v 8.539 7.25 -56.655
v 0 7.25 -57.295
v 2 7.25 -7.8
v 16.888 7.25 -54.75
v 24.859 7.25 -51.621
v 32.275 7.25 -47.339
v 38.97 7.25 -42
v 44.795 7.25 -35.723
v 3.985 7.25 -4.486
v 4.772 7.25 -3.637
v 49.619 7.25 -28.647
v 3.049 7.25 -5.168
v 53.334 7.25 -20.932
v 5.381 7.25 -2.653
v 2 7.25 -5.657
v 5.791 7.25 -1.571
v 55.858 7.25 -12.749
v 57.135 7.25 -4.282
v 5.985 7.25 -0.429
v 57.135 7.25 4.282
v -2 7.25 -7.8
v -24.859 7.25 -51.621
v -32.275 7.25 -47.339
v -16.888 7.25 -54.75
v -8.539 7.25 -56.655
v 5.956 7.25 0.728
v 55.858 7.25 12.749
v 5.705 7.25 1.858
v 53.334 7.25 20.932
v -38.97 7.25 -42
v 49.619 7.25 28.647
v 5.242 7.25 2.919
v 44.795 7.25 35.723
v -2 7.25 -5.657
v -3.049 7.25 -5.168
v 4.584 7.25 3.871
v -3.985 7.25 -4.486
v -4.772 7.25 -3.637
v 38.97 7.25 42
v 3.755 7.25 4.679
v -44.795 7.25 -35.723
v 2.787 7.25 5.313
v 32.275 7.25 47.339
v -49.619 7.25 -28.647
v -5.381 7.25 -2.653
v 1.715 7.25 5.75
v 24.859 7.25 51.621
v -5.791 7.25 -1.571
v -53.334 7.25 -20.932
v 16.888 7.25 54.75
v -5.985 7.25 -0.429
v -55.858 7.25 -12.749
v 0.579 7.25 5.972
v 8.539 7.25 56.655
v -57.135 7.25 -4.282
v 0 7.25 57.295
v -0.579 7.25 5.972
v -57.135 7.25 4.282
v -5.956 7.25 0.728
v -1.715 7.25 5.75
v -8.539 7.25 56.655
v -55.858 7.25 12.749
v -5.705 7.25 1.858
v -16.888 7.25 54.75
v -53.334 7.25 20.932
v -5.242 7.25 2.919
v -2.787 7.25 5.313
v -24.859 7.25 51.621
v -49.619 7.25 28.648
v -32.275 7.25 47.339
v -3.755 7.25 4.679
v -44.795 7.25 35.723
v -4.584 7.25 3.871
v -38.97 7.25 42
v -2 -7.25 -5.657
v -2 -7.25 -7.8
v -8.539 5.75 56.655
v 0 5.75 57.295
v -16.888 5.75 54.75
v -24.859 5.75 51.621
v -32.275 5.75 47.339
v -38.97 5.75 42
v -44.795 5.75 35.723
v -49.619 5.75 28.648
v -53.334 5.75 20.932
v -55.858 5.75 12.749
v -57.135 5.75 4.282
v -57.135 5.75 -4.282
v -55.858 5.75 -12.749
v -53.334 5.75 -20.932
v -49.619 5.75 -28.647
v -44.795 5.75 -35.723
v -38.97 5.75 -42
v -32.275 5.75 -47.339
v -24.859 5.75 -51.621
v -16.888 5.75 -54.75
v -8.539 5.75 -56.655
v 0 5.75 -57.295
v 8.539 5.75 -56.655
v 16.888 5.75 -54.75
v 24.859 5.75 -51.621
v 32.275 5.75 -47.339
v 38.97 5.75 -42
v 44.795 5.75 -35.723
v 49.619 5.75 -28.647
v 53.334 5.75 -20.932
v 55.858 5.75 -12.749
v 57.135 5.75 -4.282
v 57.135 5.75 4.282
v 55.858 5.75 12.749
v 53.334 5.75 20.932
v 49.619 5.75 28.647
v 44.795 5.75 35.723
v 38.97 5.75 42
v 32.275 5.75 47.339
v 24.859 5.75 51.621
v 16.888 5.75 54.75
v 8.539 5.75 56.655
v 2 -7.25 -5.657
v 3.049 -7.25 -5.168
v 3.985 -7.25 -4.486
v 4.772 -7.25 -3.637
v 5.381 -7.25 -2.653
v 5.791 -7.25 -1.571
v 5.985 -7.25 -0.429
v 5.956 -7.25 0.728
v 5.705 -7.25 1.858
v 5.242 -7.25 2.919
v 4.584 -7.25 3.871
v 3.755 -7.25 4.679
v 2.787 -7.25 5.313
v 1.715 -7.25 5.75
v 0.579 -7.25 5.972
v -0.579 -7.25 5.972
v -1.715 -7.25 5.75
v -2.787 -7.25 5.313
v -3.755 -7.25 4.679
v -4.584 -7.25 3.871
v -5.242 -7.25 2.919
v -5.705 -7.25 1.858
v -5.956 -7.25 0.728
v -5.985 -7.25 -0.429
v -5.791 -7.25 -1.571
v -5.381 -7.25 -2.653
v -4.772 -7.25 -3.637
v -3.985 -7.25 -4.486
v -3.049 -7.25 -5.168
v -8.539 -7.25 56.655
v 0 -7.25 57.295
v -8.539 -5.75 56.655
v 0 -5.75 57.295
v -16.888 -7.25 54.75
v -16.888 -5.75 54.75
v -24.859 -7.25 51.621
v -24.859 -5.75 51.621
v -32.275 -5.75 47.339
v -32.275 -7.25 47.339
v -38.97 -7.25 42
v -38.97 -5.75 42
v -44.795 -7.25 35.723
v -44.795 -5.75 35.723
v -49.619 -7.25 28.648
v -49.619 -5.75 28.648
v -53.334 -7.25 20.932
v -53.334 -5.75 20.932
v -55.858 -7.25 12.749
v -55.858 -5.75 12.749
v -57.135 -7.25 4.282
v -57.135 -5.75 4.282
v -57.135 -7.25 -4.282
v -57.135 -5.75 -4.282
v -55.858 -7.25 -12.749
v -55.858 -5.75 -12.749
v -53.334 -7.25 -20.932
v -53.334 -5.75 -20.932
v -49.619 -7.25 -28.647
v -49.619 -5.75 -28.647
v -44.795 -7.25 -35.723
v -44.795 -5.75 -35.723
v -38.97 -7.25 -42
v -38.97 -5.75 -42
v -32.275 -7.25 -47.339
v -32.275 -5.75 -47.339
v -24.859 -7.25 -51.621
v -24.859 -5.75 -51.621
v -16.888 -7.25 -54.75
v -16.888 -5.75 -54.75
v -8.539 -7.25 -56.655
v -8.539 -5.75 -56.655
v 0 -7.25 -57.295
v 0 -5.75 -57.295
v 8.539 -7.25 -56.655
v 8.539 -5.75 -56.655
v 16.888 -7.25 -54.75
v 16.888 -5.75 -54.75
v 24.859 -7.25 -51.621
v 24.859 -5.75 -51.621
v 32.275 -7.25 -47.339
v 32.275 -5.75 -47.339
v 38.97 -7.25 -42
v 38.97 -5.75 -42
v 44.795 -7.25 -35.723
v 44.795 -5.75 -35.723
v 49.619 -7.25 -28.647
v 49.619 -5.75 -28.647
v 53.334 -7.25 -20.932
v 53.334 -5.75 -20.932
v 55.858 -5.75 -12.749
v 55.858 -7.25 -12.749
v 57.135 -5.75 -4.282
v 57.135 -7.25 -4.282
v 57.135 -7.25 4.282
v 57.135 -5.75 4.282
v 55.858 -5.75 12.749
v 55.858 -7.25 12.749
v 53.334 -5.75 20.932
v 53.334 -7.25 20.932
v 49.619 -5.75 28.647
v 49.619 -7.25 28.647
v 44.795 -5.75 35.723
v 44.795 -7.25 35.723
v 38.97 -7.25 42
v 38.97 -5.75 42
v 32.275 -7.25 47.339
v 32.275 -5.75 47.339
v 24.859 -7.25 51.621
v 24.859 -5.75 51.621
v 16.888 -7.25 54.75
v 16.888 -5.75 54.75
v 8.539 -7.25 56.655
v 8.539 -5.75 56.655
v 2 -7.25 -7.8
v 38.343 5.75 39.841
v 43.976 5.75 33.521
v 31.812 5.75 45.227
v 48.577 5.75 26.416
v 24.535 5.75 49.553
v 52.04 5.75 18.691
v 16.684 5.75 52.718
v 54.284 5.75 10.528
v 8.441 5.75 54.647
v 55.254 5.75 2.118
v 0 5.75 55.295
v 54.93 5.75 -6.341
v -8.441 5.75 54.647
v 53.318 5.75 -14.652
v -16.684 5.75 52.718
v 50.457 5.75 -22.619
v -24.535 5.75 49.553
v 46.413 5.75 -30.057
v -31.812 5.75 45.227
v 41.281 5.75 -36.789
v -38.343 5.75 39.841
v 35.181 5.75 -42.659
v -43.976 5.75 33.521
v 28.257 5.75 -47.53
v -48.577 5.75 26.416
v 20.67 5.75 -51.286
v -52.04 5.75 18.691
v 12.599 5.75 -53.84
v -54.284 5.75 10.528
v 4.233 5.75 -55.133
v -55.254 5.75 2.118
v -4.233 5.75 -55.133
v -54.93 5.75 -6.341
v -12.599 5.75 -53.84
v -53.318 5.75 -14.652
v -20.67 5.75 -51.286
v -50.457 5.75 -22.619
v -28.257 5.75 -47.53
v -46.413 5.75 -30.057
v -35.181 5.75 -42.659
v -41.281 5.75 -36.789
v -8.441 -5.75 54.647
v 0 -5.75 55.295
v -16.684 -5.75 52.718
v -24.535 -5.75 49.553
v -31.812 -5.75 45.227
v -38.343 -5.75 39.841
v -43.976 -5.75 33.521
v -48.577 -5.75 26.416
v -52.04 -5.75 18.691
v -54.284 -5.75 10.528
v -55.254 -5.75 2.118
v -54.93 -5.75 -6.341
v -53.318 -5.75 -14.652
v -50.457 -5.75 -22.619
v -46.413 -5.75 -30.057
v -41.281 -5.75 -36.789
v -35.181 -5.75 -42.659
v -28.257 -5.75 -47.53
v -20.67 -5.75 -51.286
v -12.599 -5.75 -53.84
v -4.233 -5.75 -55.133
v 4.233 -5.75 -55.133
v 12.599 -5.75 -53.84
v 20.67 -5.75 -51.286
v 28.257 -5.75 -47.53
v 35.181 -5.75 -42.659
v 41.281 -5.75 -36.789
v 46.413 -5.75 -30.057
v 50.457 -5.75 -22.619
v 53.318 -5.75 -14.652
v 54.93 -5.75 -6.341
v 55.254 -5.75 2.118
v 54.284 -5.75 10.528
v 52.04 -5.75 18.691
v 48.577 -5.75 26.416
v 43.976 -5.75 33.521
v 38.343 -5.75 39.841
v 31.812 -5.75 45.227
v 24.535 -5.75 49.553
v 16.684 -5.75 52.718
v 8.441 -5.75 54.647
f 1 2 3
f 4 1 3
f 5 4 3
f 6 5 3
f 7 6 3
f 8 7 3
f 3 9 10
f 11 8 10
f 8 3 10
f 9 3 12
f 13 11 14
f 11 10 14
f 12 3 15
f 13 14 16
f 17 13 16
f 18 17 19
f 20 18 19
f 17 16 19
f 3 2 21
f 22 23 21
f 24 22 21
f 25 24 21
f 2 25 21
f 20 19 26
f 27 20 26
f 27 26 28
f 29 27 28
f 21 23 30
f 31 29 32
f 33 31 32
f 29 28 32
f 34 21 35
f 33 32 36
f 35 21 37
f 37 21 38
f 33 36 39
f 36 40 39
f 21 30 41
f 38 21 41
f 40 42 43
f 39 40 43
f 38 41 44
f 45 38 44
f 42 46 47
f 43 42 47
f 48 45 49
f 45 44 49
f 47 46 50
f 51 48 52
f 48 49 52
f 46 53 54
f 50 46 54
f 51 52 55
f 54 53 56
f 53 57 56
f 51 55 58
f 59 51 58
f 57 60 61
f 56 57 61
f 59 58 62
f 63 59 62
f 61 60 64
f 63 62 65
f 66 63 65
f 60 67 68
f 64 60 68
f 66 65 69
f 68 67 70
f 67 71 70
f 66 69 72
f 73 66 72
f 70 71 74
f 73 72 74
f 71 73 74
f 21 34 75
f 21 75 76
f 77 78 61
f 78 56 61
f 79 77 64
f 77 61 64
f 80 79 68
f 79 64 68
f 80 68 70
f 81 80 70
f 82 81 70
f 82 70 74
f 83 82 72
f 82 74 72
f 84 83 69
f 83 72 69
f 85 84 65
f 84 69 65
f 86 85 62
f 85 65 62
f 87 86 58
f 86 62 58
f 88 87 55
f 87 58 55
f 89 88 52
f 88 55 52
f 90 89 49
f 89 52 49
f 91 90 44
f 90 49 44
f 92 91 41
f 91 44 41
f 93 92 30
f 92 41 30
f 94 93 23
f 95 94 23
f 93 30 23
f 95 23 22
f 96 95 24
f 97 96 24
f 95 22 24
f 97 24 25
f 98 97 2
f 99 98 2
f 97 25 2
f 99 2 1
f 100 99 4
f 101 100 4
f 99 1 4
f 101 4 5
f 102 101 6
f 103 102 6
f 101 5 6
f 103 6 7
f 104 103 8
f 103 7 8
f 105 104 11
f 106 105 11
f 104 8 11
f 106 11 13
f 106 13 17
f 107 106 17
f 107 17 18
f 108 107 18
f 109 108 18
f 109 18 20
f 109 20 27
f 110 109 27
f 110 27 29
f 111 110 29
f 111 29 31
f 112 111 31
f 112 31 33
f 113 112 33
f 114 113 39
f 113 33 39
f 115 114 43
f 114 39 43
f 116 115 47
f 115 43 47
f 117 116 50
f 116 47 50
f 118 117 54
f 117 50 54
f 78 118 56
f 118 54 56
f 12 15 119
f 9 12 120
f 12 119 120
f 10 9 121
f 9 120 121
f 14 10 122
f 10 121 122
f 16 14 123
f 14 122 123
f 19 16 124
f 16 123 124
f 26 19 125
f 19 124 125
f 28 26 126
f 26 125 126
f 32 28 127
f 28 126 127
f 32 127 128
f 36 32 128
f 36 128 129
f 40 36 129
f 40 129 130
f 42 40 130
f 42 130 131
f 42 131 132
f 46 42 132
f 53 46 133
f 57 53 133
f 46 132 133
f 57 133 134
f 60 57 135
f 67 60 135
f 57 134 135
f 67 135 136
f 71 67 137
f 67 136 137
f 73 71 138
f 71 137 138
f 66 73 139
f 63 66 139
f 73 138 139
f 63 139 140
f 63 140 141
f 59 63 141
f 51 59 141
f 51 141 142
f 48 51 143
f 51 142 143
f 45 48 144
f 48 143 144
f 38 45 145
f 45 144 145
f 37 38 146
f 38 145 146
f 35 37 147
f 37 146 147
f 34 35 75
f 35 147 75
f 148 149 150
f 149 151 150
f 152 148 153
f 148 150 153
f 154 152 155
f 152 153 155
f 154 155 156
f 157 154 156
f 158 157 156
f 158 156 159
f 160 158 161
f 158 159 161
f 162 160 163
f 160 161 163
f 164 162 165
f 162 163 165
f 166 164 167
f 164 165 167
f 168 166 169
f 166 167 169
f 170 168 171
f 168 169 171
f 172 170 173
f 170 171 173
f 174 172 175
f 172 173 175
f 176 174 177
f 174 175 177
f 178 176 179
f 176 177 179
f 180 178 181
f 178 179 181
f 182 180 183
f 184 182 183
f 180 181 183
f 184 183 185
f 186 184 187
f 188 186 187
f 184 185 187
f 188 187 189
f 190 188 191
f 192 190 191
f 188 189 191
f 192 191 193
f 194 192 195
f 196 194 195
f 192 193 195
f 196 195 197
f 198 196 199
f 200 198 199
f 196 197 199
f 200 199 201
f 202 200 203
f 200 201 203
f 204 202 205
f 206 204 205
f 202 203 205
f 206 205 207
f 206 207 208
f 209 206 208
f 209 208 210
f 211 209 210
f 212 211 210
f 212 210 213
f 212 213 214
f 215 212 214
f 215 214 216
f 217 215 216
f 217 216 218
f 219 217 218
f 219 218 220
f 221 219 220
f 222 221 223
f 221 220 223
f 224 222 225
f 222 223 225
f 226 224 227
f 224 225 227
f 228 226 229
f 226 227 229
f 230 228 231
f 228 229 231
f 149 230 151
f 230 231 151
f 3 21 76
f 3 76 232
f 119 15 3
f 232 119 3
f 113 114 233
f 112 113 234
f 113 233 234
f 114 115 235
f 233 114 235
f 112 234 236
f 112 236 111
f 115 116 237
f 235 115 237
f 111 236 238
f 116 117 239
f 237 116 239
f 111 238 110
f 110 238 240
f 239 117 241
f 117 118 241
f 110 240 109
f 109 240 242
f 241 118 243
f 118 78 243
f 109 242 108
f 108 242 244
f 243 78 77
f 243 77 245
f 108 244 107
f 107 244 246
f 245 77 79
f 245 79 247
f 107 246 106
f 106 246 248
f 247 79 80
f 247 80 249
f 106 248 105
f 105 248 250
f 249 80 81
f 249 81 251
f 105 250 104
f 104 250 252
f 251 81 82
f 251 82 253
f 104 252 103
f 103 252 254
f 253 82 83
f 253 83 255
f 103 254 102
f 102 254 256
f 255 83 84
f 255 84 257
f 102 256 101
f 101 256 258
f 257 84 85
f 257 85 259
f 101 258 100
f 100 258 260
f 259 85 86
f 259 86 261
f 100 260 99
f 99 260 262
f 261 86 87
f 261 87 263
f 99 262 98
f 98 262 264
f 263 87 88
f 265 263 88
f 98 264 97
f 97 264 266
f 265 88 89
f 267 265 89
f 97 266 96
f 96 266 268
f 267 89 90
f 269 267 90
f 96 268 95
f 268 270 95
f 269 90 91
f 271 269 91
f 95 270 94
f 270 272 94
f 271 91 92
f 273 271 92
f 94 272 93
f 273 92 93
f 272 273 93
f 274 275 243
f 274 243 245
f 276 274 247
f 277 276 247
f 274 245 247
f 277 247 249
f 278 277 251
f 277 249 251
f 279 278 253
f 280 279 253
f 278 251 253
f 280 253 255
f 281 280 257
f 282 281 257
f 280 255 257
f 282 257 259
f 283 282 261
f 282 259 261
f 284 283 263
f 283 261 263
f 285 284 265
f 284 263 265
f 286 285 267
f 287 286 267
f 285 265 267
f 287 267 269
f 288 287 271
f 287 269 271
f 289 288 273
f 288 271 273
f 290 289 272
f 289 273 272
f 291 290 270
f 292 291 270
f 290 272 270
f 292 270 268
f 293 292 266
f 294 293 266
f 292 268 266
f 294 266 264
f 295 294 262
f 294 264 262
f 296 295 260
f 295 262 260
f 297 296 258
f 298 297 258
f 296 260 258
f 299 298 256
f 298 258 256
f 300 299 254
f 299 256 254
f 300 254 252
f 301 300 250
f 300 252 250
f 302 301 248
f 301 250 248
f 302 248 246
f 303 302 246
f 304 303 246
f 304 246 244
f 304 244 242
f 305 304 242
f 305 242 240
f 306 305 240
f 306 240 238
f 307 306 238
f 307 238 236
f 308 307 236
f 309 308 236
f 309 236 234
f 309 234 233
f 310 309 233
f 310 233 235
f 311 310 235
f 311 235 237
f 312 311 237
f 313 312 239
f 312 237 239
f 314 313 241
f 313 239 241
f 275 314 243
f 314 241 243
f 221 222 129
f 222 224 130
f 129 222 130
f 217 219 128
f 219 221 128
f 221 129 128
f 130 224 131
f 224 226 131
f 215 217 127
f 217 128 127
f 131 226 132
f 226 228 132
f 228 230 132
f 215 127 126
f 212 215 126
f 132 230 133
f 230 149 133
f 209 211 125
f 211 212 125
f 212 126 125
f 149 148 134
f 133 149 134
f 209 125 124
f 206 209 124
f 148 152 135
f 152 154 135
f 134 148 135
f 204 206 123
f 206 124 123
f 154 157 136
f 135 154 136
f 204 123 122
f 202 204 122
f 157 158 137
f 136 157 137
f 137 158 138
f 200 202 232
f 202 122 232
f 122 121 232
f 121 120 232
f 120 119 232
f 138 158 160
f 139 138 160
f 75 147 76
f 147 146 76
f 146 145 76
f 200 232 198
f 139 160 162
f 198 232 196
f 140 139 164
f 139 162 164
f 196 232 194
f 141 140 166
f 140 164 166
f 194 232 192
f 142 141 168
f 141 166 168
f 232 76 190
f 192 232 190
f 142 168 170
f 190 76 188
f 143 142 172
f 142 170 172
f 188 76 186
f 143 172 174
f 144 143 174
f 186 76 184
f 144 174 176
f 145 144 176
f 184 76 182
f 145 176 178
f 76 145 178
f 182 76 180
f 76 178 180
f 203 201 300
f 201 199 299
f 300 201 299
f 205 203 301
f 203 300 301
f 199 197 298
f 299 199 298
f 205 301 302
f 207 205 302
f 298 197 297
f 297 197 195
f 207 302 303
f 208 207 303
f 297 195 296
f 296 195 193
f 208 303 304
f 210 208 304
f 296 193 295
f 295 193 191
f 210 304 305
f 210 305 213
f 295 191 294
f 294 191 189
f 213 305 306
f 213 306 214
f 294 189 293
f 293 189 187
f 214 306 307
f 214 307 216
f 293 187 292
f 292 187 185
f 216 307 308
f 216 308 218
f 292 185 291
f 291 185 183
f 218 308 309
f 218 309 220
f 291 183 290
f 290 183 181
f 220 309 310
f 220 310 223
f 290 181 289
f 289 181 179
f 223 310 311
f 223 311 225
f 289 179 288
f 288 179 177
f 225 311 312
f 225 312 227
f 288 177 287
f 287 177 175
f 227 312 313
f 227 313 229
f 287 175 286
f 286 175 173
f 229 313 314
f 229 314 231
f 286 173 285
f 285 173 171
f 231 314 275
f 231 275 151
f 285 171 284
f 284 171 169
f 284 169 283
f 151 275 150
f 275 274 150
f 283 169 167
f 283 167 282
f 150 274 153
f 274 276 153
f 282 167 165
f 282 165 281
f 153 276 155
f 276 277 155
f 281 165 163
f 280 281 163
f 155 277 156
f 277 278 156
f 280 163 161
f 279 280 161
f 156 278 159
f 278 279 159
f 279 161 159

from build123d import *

# Parameters (mm, degrees)
SKETCH2_W          = 4
SKETCH2_H          = 4.3
CUT_EXTRUDE1_DEPTH = 83.314543369


with BuildPart() as part:
    # Sketch1 → Revolve1 (revolve)
    with BuildSketch(Plane(origin=(0, 0, 0), x_dir=(0, 0, -1), z_dir=(1, 0, 0)), mode=Mode.PRIVATE) as revolve1_sk:
        Polygon((55.295, -5.75), (55.295, 5.75), (57.295, 5.75), (57.295, 7.25), (6, 7.25), (6, -7.25), (57.295, -7.25), (57.295, -5.75), align=None)
    revolve(revolve1_sk.sketch.rotate(Axis((0, 10.31552251, 0), (0, -1, 0)), 180), axis=Axis((0, 10.31552251, 0), (0, -1, 0)))

    # Sketch2 → Cut-Extrude1 (cut, through all)
    with BuildSketch(Plane(origin=(0, 7.25, 0), x_dir=(1, 0, 0), z_dir=(0, 1, 0))):
        with Locations((0, 5.65)):
            Rectangle(SKETCH2_W, SKETCH2_H)
    extrude(amount=-CUT_EXTRUDE1_DEPTH, mode=Mode.SUBTRACT)


solid = part.part
